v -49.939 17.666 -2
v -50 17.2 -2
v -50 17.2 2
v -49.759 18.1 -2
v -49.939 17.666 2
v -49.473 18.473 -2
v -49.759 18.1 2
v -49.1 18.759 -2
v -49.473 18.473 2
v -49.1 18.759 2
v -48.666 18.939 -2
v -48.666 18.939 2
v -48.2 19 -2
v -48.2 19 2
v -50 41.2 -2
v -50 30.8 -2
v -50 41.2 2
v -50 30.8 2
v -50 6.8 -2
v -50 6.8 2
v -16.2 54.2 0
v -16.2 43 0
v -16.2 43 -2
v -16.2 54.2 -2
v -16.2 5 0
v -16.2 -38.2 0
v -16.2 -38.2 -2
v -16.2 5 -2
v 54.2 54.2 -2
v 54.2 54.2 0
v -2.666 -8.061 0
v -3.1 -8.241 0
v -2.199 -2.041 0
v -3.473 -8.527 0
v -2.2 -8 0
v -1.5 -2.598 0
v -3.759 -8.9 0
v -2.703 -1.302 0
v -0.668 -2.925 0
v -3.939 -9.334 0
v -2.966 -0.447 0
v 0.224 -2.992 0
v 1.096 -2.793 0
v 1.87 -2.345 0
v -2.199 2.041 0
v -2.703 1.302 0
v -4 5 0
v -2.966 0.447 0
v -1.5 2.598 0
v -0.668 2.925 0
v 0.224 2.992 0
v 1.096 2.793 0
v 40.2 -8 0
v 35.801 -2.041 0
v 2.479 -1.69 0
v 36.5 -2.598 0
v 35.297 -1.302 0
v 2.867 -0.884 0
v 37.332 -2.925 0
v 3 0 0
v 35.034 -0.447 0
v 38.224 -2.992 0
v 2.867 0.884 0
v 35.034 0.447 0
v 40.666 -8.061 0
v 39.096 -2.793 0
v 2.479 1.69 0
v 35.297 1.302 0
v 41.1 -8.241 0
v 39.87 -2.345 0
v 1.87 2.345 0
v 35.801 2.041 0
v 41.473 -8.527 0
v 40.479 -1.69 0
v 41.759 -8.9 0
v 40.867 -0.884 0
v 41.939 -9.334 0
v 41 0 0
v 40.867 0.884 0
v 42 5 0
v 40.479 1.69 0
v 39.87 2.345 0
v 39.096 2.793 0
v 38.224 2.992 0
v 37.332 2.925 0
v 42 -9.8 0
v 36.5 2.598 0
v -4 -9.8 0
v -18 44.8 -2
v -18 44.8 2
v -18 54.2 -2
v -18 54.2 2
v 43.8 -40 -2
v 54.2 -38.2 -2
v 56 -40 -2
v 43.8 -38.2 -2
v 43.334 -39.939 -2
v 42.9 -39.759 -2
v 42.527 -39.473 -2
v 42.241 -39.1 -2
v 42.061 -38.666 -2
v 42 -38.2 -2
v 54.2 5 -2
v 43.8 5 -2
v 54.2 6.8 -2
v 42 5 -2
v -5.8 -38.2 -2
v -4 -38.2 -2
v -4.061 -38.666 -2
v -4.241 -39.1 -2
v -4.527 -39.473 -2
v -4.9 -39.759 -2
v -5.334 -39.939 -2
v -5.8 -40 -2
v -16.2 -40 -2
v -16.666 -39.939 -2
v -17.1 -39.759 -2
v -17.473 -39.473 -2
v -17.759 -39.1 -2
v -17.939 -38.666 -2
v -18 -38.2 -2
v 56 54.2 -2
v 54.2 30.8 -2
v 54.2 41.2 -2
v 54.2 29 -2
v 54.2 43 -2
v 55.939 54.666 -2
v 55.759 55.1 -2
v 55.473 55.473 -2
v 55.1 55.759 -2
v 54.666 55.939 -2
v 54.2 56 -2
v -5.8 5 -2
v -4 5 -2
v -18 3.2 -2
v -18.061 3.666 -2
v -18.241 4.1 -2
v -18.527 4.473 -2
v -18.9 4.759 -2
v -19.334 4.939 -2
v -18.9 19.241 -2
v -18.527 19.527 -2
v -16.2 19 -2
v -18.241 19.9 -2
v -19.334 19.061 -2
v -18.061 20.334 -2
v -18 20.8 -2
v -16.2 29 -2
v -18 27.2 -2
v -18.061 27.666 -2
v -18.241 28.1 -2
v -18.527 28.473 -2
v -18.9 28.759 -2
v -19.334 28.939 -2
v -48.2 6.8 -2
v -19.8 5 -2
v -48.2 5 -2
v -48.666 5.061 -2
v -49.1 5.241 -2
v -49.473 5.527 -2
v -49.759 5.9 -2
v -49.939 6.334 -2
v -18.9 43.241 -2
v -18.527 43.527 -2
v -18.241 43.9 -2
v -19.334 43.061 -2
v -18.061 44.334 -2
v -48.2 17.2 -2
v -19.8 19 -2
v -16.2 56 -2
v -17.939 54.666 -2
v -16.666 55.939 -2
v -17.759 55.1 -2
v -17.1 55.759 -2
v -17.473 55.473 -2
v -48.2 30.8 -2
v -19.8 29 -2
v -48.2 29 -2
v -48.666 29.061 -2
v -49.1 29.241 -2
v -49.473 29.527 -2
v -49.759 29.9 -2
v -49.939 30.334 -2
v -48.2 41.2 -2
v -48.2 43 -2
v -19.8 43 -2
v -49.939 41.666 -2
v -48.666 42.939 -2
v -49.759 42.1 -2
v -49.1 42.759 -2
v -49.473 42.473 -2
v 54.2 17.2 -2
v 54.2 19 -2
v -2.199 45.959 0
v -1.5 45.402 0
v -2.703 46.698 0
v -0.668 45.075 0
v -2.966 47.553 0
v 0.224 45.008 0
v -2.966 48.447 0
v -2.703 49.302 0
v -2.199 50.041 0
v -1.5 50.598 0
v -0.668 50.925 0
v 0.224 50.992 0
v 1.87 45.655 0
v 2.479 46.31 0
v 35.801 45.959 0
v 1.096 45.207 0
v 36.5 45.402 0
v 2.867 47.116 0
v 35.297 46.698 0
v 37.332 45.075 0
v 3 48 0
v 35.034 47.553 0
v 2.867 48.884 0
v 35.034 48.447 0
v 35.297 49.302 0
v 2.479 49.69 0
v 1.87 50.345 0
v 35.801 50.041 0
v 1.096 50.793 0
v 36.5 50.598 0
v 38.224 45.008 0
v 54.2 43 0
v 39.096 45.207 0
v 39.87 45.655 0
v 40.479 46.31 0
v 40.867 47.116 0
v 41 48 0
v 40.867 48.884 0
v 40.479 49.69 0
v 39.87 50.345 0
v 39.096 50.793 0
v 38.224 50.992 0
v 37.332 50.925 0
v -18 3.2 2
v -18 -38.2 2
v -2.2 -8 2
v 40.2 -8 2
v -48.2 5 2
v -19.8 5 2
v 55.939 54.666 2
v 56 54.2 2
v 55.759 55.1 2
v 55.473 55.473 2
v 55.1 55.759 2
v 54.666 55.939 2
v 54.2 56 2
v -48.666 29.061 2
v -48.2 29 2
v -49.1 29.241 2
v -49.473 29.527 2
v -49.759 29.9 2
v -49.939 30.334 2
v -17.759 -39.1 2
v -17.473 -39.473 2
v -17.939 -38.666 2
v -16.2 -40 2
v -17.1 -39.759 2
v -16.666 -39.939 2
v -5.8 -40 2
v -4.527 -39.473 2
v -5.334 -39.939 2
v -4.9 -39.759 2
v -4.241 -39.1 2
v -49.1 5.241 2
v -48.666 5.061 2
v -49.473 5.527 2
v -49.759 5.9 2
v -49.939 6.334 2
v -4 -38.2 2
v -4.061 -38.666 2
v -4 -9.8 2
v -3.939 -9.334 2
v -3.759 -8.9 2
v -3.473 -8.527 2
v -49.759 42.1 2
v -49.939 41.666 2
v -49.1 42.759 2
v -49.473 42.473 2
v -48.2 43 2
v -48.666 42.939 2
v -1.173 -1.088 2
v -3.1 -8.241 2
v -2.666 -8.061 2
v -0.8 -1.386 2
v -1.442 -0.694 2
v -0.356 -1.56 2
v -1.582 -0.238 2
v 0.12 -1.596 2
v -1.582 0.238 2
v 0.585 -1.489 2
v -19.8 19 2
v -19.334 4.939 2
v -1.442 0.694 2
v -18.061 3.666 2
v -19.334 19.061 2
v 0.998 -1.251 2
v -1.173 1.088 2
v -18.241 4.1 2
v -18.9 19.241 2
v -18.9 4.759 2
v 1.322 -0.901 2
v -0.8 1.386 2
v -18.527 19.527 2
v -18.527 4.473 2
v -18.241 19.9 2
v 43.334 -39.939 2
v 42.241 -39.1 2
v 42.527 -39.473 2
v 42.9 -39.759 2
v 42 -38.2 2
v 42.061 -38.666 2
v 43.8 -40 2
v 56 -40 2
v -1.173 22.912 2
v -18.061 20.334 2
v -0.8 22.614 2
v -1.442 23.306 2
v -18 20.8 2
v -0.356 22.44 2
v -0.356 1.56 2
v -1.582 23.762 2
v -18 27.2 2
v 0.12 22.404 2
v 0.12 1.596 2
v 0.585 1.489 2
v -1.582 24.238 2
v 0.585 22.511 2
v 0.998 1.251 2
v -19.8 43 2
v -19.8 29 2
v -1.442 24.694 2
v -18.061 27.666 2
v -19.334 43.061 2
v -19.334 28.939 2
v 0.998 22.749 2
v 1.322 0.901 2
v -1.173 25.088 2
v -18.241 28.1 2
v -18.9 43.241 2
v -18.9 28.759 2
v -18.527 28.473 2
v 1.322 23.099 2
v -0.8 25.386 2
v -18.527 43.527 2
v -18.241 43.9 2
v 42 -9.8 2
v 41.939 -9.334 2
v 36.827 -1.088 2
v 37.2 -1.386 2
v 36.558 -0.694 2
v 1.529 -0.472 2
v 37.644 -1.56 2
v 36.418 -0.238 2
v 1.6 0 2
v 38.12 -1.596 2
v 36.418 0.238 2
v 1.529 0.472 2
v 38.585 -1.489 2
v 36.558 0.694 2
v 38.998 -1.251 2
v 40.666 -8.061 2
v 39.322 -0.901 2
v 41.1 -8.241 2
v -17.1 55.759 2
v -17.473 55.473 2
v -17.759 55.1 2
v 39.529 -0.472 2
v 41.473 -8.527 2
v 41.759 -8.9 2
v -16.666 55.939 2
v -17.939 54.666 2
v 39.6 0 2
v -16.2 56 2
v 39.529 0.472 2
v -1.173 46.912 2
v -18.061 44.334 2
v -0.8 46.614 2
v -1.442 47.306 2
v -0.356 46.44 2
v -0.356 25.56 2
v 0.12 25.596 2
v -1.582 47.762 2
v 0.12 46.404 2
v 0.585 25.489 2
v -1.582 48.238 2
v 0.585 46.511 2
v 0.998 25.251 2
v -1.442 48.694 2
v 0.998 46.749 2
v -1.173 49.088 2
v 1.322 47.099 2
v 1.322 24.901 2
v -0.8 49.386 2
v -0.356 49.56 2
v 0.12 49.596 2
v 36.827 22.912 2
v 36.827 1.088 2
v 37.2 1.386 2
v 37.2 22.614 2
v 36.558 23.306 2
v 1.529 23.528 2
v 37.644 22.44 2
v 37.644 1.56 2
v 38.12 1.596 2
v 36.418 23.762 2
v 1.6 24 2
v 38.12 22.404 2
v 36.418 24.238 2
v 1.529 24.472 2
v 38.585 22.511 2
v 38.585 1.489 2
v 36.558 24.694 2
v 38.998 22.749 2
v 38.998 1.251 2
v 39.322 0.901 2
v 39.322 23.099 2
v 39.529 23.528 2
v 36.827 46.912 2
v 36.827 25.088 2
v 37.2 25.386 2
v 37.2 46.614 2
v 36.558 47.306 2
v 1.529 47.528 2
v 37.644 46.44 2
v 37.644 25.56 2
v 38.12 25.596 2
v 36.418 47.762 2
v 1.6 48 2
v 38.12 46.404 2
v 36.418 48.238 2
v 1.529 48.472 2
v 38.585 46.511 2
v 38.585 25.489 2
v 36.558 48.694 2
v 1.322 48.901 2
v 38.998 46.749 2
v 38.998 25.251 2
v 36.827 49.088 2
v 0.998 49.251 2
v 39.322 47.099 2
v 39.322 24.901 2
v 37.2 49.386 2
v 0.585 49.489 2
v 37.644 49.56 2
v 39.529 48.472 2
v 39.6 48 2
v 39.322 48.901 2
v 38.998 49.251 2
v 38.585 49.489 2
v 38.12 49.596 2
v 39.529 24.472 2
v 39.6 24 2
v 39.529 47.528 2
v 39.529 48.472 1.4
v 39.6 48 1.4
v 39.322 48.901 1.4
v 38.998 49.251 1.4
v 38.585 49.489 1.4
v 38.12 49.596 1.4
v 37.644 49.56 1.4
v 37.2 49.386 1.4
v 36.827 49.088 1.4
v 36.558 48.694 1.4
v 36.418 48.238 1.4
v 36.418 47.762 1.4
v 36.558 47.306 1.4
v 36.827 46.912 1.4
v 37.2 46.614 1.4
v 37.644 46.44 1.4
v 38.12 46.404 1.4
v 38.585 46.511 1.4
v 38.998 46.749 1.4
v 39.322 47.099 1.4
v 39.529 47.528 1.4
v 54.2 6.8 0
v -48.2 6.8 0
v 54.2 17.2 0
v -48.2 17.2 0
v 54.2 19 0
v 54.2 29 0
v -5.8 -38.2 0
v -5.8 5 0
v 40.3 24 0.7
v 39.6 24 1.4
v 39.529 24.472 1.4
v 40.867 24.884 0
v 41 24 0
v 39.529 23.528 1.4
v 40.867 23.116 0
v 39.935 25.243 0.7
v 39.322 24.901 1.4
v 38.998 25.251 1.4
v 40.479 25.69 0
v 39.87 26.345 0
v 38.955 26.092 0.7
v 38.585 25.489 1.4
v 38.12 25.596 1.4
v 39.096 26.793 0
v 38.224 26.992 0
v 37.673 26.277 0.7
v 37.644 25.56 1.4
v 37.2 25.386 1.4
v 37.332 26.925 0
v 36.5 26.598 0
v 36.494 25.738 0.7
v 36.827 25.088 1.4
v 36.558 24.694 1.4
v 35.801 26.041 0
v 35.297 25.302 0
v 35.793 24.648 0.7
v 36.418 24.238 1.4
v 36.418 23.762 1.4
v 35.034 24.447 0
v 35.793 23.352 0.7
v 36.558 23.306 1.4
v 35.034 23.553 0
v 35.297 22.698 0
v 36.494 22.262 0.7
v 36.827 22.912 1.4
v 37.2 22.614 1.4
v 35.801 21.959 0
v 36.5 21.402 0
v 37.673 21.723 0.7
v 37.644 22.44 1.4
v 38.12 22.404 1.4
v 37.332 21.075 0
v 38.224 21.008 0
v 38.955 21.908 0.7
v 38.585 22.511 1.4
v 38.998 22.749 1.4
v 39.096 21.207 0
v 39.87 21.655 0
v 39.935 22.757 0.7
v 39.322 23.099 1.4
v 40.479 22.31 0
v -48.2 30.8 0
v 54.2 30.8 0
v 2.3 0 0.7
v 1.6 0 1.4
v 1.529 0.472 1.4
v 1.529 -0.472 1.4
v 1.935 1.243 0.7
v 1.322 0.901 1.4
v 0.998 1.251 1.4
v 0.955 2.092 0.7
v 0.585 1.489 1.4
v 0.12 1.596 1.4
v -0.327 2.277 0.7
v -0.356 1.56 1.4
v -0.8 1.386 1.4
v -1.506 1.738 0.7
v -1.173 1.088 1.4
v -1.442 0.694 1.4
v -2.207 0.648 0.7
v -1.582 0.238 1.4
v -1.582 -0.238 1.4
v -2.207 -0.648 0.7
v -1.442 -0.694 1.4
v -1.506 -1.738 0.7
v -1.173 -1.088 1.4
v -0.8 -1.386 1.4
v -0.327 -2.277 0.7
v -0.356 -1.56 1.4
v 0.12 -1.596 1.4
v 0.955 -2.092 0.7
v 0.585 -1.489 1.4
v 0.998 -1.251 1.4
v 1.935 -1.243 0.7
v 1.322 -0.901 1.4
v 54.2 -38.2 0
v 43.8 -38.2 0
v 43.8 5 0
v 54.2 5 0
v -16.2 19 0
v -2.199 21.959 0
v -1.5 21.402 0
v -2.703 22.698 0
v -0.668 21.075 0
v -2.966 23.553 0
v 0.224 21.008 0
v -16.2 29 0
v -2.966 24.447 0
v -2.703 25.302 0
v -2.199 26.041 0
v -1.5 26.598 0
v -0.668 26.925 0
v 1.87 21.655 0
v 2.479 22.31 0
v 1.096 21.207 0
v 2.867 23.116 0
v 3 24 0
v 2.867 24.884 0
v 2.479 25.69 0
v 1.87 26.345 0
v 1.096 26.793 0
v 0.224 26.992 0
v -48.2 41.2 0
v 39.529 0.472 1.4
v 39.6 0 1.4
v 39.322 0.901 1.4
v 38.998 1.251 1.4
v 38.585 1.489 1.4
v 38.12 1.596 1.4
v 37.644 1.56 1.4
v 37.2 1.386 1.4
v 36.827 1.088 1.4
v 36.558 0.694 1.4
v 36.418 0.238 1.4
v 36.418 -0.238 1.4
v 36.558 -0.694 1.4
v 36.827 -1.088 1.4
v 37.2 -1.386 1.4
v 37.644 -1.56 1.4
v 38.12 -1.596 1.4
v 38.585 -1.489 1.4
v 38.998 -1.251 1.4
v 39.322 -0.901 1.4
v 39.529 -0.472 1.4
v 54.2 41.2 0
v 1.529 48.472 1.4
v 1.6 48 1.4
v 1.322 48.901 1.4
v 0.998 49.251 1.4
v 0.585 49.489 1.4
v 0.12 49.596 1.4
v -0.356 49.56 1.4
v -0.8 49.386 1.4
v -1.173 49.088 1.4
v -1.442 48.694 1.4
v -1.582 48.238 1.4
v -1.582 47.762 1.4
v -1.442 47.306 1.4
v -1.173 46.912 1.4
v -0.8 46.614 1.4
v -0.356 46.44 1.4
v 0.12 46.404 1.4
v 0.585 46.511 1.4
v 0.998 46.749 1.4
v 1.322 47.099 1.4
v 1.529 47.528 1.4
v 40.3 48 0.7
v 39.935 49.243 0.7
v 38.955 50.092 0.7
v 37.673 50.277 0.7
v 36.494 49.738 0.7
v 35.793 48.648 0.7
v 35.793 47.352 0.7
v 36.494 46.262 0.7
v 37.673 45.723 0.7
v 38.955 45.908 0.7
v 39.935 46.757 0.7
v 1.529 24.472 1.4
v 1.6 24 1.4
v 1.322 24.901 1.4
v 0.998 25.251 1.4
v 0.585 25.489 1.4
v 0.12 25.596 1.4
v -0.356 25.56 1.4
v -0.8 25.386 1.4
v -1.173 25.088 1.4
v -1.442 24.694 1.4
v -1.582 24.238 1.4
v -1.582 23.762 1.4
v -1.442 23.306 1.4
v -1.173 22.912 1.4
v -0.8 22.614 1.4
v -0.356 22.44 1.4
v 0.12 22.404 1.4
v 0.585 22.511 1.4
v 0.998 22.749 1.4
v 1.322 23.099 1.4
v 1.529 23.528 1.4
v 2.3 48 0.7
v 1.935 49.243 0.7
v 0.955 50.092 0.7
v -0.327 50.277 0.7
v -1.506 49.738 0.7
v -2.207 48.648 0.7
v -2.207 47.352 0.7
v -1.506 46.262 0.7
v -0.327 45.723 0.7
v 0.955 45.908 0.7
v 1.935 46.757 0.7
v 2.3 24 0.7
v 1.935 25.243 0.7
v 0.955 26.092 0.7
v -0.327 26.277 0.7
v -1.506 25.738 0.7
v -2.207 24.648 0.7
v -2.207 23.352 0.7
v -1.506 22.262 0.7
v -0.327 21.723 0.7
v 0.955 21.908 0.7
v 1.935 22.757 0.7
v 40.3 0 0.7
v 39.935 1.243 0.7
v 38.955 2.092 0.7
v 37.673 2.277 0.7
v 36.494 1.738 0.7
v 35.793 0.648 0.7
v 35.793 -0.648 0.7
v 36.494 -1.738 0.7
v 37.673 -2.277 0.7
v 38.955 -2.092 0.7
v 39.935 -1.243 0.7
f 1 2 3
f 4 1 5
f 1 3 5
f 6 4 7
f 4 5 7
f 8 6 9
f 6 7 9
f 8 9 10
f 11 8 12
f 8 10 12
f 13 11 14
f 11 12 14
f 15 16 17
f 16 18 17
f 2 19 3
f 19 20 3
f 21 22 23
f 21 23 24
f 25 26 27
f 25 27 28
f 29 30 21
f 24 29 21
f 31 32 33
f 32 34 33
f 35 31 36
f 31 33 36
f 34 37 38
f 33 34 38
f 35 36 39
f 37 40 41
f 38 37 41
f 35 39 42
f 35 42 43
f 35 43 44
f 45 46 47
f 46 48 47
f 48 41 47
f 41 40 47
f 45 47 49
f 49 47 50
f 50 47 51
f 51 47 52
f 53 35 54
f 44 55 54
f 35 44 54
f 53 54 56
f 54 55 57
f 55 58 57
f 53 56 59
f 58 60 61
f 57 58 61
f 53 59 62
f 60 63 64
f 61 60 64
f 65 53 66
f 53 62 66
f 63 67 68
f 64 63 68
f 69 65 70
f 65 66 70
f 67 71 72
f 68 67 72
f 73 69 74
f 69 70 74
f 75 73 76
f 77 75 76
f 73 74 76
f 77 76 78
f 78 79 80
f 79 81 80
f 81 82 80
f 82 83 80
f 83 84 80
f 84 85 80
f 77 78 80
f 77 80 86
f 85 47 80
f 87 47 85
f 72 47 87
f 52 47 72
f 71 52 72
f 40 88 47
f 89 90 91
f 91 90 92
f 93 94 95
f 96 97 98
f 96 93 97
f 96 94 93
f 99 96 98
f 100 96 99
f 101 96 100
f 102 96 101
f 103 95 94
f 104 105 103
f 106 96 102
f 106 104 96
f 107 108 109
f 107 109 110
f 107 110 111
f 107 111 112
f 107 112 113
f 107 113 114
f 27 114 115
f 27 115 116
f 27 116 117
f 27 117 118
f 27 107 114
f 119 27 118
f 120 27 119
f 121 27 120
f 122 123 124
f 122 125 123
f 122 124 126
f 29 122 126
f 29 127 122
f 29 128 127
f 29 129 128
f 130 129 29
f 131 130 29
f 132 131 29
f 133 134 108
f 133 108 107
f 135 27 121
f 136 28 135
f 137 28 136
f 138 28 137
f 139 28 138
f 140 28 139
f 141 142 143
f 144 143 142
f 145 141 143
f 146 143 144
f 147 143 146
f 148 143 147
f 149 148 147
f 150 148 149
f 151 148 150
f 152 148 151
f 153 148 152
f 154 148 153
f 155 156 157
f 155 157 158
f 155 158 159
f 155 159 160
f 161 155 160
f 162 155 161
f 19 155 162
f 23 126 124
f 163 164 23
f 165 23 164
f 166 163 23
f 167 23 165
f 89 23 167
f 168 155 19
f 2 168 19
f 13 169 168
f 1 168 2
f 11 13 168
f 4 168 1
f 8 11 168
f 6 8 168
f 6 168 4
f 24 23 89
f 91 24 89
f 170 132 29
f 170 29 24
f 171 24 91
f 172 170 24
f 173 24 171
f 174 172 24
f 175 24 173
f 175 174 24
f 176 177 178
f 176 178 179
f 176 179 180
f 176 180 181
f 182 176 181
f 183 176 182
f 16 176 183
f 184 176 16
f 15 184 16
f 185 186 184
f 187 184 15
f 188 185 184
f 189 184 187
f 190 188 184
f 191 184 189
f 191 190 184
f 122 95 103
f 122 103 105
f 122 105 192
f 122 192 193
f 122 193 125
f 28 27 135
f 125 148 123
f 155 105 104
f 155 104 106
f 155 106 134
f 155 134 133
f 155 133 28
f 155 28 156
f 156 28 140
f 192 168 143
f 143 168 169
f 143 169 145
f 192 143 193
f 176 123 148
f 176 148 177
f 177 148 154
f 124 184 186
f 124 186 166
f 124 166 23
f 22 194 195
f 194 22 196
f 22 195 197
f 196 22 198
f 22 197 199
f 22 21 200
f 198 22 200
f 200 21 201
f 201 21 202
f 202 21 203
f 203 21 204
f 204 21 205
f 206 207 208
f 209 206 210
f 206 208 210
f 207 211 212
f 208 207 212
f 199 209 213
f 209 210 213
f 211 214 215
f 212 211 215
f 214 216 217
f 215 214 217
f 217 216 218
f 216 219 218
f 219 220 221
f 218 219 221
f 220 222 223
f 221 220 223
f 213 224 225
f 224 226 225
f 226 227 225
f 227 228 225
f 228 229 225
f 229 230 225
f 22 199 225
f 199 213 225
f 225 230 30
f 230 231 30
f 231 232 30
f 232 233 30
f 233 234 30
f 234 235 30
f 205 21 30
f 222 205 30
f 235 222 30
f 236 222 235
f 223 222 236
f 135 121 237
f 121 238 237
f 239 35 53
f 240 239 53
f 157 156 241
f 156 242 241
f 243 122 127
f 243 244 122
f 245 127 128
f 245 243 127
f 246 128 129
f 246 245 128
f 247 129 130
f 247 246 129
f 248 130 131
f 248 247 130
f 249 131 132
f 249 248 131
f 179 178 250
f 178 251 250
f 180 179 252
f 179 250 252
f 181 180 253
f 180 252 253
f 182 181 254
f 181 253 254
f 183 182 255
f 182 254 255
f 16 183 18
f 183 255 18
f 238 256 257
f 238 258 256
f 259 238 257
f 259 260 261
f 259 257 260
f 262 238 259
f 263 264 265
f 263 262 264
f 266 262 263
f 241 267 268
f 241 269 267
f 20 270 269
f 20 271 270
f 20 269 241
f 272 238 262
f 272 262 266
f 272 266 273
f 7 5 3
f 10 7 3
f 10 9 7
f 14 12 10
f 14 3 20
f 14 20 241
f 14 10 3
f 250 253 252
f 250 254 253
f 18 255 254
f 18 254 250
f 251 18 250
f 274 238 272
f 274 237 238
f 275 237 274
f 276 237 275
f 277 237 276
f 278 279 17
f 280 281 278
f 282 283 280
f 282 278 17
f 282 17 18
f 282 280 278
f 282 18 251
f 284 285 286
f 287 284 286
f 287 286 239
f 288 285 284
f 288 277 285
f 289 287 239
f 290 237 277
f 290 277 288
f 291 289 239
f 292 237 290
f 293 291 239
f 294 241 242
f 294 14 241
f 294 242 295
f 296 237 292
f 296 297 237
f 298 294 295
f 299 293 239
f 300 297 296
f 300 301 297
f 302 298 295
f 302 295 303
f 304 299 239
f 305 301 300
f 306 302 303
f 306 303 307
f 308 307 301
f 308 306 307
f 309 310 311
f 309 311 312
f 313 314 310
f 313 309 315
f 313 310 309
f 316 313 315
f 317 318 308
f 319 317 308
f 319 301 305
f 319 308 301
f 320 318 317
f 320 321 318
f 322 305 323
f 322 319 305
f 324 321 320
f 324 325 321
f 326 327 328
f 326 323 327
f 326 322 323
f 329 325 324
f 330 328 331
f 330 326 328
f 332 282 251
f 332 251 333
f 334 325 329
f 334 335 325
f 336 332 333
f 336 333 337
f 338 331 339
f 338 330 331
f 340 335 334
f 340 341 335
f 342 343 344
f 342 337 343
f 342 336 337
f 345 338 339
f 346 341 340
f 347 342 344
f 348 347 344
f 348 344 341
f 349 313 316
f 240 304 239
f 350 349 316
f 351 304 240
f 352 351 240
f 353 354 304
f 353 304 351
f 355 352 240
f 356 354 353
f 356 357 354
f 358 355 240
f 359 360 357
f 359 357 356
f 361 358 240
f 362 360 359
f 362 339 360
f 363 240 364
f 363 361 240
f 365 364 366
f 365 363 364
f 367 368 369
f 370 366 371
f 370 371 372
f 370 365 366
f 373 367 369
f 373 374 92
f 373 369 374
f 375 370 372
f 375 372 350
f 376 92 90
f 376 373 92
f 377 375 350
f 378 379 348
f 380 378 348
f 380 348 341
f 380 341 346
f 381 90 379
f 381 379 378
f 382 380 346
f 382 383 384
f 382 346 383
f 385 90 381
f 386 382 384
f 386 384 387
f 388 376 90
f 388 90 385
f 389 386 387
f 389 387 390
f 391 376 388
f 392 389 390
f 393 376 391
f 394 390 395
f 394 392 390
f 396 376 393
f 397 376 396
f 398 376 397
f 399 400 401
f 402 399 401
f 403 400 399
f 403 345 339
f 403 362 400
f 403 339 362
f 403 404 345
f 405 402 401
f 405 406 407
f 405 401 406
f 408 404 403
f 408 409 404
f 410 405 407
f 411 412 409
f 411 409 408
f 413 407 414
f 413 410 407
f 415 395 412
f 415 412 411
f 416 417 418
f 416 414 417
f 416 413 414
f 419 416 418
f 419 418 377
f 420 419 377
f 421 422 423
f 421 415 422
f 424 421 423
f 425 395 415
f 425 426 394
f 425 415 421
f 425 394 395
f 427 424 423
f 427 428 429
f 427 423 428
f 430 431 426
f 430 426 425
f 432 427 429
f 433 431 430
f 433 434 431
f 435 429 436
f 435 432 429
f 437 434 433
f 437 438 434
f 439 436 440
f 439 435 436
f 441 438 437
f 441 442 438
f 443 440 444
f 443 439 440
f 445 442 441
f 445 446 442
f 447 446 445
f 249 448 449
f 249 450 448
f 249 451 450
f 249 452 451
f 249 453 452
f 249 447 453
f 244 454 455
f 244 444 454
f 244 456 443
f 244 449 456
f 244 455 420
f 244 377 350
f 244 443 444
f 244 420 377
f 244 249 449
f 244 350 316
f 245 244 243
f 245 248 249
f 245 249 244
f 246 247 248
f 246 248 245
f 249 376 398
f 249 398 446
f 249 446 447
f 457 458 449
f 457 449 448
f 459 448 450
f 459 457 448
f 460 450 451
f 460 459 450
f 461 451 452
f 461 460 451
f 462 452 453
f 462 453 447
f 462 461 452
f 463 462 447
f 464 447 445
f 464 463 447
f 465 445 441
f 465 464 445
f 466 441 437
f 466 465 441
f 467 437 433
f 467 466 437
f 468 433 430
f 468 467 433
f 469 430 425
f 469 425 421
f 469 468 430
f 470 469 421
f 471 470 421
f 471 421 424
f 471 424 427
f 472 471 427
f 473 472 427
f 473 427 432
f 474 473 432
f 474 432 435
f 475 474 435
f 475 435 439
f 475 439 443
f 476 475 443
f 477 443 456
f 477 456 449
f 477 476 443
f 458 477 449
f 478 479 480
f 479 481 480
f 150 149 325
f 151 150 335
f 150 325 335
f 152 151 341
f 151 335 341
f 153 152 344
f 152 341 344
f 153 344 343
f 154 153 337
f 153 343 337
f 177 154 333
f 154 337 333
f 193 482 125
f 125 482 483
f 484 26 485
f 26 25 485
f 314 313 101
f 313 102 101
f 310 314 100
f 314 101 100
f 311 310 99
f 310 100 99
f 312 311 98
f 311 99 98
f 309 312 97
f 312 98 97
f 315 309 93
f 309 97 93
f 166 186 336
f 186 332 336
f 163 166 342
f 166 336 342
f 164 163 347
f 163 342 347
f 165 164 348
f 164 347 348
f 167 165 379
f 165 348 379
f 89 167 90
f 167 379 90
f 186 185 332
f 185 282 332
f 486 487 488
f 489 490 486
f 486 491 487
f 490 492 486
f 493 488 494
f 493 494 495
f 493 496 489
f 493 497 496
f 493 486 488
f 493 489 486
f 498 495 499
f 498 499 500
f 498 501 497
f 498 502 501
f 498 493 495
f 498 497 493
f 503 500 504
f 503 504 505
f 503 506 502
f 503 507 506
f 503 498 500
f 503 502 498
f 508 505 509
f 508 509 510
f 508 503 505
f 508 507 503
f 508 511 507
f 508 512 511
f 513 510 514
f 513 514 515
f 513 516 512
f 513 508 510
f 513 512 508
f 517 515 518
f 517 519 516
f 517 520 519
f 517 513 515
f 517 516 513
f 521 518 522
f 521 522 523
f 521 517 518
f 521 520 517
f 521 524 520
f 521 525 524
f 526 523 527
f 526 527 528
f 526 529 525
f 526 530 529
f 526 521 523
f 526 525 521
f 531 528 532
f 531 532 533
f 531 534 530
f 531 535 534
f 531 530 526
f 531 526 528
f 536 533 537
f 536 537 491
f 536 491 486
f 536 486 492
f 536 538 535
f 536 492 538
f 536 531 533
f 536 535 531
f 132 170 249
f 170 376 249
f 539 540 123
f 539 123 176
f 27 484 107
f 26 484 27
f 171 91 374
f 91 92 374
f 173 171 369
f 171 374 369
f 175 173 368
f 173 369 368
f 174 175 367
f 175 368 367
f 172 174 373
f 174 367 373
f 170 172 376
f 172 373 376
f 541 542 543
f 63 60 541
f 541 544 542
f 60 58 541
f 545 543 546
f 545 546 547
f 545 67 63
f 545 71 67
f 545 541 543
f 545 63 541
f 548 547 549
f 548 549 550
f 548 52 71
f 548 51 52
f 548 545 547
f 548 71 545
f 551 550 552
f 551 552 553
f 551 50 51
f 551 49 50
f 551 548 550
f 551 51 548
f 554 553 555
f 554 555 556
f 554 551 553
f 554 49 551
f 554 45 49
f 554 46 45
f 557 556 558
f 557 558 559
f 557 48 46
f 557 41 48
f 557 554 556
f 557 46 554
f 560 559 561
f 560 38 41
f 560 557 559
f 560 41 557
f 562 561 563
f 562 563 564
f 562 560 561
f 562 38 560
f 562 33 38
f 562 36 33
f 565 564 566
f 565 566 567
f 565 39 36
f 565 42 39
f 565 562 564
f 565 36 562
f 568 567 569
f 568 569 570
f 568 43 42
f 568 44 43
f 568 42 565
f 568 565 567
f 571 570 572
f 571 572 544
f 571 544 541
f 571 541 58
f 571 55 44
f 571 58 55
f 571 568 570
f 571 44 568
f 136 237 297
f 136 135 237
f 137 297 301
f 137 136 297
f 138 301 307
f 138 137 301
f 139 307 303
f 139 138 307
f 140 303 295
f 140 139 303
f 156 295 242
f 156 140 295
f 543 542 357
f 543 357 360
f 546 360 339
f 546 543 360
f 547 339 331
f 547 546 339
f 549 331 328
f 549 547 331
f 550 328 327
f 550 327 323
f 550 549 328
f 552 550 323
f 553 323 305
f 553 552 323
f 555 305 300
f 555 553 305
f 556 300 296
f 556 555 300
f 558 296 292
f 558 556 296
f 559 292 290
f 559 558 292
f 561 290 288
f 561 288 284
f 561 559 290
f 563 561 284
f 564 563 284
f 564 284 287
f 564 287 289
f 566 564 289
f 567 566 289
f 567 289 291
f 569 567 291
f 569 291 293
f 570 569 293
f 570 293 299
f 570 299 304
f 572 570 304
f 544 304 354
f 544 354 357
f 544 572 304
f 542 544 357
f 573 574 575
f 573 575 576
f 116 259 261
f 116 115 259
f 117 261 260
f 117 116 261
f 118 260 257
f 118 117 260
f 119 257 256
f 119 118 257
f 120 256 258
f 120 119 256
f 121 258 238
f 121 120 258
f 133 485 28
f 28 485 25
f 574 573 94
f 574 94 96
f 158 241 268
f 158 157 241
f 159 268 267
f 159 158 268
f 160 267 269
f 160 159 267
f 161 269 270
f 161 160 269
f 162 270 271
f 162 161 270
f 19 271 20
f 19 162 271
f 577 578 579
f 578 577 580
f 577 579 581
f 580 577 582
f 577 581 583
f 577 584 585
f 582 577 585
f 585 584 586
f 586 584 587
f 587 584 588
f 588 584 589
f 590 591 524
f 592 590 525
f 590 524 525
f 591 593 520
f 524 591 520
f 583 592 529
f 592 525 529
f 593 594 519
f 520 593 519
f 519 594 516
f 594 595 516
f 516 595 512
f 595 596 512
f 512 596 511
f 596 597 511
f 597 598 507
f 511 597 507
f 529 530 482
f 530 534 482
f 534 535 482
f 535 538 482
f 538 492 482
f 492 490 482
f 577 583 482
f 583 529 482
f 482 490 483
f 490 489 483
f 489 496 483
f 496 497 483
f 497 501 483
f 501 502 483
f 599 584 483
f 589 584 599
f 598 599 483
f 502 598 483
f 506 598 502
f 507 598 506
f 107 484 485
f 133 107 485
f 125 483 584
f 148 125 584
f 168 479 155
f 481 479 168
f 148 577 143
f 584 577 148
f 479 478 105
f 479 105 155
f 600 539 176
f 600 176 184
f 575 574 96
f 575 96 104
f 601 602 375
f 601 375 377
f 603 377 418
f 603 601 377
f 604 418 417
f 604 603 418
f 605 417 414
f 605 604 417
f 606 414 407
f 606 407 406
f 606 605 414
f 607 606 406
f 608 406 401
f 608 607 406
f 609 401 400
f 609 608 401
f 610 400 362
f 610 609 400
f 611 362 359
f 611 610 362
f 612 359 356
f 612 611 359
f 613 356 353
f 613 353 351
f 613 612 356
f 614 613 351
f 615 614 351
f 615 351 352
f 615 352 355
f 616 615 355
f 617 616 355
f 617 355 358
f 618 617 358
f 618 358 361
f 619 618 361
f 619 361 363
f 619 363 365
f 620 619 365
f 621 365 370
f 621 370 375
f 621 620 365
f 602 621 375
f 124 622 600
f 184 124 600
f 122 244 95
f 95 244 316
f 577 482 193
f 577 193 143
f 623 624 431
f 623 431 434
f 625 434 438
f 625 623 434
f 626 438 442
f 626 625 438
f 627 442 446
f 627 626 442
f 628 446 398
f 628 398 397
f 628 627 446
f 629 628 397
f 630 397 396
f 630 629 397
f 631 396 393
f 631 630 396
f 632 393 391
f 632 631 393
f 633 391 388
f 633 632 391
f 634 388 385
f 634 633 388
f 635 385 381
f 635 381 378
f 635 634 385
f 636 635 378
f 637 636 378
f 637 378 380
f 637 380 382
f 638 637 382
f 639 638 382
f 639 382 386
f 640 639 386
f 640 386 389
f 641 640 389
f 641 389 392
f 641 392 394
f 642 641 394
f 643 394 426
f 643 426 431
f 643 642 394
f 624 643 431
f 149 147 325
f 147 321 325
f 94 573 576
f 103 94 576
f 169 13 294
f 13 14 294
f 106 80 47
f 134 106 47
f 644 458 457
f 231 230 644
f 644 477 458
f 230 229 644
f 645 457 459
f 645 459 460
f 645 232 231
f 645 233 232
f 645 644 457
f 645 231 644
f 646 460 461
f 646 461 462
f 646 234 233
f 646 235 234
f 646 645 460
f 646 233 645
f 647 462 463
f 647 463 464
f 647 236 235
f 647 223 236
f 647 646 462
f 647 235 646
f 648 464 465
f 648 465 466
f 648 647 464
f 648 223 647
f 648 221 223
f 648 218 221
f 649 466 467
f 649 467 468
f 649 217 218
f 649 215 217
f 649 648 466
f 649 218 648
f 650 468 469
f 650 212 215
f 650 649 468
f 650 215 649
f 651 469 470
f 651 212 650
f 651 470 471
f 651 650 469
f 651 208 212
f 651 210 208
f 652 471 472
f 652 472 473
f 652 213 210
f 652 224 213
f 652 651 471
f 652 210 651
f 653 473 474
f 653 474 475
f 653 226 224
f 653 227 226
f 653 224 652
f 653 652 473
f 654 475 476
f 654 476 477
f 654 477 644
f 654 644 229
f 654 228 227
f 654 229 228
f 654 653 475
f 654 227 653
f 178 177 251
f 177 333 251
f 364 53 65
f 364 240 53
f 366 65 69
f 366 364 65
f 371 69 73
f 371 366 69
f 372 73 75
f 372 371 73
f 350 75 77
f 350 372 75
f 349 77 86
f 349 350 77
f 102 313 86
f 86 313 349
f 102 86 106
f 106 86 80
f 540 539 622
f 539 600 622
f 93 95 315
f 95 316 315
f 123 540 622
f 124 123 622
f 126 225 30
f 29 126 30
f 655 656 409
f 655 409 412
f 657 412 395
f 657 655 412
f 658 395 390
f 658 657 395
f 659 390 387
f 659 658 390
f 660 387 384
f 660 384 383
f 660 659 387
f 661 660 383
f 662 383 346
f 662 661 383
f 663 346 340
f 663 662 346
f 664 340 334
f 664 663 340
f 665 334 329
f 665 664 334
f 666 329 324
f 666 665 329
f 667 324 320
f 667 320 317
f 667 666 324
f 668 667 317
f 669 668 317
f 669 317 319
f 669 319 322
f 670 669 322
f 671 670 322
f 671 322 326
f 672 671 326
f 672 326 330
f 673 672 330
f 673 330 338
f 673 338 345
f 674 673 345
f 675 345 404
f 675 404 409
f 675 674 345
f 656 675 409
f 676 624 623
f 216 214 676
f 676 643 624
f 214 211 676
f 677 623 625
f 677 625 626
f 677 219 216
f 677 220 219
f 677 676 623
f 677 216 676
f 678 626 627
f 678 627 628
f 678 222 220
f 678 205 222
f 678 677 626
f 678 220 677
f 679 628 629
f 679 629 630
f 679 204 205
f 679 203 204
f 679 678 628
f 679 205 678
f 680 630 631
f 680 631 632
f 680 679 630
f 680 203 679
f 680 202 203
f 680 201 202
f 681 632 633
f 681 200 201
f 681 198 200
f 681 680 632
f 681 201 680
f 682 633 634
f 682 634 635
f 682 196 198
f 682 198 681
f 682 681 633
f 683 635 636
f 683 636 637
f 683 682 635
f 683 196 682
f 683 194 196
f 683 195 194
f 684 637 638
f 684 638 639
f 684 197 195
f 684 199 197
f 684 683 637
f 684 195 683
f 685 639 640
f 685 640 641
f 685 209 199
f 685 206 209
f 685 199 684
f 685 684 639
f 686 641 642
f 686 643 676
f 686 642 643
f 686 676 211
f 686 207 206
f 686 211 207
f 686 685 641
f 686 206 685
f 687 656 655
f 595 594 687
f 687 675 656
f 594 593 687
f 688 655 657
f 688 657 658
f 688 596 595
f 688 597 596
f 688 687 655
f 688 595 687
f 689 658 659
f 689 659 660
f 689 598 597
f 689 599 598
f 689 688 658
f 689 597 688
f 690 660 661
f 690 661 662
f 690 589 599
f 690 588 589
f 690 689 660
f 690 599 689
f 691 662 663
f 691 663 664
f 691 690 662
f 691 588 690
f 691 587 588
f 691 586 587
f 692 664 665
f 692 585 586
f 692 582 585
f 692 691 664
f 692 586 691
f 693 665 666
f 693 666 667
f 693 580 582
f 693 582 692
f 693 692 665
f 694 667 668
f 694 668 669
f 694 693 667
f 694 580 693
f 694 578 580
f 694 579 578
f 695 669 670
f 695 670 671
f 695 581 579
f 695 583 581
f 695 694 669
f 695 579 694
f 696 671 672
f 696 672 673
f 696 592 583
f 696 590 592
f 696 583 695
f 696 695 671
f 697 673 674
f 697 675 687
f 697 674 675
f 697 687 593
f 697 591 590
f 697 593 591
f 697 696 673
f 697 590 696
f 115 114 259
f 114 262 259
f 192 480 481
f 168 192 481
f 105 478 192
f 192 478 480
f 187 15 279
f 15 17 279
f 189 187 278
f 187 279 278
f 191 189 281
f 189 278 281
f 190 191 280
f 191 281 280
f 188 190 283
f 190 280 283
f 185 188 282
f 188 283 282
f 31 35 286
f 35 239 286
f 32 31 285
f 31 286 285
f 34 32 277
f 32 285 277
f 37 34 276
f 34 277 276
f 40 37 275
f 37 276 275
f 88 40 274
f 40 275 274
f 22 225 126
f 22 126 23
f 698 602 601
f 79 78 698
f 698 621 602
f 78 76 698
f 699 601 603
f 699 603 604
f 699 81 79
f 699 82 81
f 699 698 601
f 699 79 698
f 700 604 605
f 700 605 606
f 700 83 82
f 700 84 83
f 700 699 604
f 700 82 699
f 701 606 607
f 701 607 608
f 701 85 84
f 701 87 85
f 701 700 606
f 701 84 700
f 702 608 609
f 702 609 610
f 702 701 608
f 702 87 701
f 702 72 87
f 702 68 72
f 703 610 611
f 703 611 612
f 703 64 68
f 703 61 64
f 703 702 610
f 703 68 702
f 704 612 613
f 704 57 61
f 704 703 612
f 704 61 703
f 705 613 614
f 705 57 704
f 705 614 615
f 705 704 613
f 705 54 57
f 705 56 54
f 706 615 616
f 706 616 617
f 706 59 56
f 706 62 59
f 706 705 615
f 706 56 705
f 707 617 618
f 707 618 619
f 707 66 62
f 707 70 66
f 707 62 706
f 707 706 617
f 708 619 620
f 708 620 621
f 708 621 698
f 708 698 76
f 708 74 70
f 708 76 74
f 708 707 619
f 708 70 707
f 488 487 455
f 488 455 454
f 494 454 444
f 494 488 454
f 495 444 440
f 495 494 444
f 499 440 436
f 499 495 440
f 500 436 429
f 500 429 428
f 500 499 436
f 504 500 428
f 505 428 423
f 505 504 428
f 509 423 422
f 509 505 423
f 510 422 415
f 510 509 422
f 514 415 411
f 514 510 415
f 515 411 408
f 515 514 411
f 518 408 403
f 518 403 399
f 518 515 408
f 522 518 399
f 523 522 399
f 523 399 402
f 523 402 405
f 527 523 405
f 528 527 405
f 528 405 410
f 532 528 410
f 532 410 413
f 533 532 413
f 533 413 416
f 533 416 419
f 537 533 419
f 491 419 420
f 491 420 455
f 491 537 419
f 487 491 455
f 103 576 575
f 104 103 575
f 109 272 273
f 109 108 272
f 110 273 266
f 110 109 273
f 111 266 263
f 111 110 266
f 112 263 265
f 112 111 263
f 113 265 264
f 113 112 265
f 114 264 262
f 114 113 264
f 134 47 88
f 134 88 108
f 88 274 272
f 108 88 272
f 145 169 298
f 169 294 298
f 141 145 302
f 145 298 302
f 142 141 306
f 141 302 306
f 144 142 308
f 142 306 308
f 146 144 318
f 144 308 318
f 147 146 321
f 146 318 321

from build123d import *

# Parameters (mm, degrees)
SKETCH_1_W      = 32
SKETCH_1_H      = 14
SKETCH_1_W_2    = 74
SKETCH_1_H_2    = 64
SKETCH_1_R      = 1.6
SKETCH_1_W_3    = 14
SKETCH_1_H_3    = 32
EXTRUDE_1_DEPTH = 2
CHAMFER_1_SIZE  = 1.4
SKETCH_2_W      = 10.4
SKETCH_2_H      = 43.2
SKETCH_2_W_2    = 102.4
SKETCH_2_H_2    = 10.4
SKETCH_2_W_3    = 70.4
SKETCH_2_H_3    = 10
SKETCH_2_H_4    = 11.2
EXTRUDE_2_DEPTH = 2
FILLET_1_R      = 1.8


with BuildPart() as part:
    # 草图1 → 凸台-拉伸1 (new body)
    # profile 1 of 5: a face of its own
    with BuildSketch(Plane.XY):
        with Locations((-34, 12)):
            Rectangle(SKETCH_1_W, SKETCH_1_H)
    # profile 2 of 5: a face of its own
    with BuildSketch(Plane.XY):
        with Locations((-34, 36)):
            Rectangle(SKETCH_1_W, SKETCH_1_H)
    # profile 3 of 5: a face of its own
    with BuildSketch(Plane.XY):
        with Locations((19, 24)):
            Rectangle(SKETCH_1_W_2, SKETCH_1_H_2)
        with Locations((0, 48)):
            Circle(SKETCH_1_R, mode=Mode.SUBTRACT)
        with Locations((0, 24)):
            Circle(SKETCH_1_R, mode=Mode.SUBTRACT)
        with Locations((38, 48)):
            Circle(SKETCH_1_R, mode=Mode.SUBTRACT)
        with Locations((38, 24)):
            Circle(SKETCH_1_R, mode=Mode.SUBTRACT)
        with Locations((38, 0)):
            Circle(SKETCH_1_R, mode=Mode.SUBTRACT)
        Circle(SKETCH_1_R, mode=Mode.SUBTRACT)
    # profile 4 of 5: a face of its own
    with BuildSketch(Plane.XY):
        with Locations((-11, -24)):
            Rectangle(SKETCH_1_W_3, SKETCH_1_H_3)
    # profile 5 of 5: a face of its own
    with BuildSketch(Plane.XY):
        with Locations((49, -24)):
            Rectangle(SKETCH_1_W_3, SKETCH_1_H_3)
    extrude(amount=EXTRUDE_1_DEPTH)

    # 倒角1
    chamfer_1_edges = [part.edges().sort_by_distance(p)[0] for p in [
        (-1.6, 0, 0),
        (36.4, 0, 0),
        (36.4, 24, 0),
        (36.4, 48, 0),
        (-1.6, 24, 0),
        (-1.6, 48, 0),
    ]]
    chamfer(chamfer_1_edges, length=CHAMFER_1_SIZE)

    # 草图2 → 凸台-拉伸2 (add)
    with BuildSketch(Plane(origin=(0, 0, 0), x_dir=(-1, 0, 0), z_dir=(0, 0, -1))):
        Polygon((-56, 56), (-56, -40), (-42, -40), (-42, 5), (4, 5), (4, -40), (18, -40), (18, 5), (50, 5), (50, 19), (18, 19), (18, 29), (50, 29), (50, 43), (18, 43), (18, 56), align=None)
        with Locations((11, -16.6)):
            Rectangle(SKETCH_2_W, SKETCH_2_H, mode=Mode.SUBTRACT)
        with Locations((-49, -16.6)):
            Rectangle(SKETCH_2_W, SKETCH_2_H, mode=Mode.SUBTRACT)
        with Locations((-3, 12)):
            Rectangle(SKETCH_2_W_2, SKETCH_2_H_2, mode=Mode.SUBTRACT)
        with Locations((-19, 24)):
            Rectangle(SKETCH_2_W_3, SKETCH_2_H_3, mode=Mode.SUBTRACT)
        with Locations((-3, 36)):
            Rectangle(SKETCH_2_W_2, SKETCH_2_H_2, mode=Mode.SUBTRACT)
        with Locations((-19, 48.6)):
            Rectangle(SKETCH_2_W_3, SKETCH_2_H_4, mode=Mode.SUBTRACT)
    extrude(amount=EXTRUDE_2_DEPTH)

    # 圆角1
    fillet_1_edges = [part.edges().sort_by_distance(p)[0] for p in [
        (-18, 19, 0),
        (-18, 29, 0),
        (-50, 29, 0),
        (-50, 43, 0),
        (-18, 43, 0),
        (-18, 56, 0),
        (56, 56, 0),
        (42, -40, 0),
        (42, -8, 1),
        (-4, -8, 1),
        (-4, -40, 0),
        (-18, -40, 0),
        (-18, 5, 0),
        (-50, 5, 0),
        (-50, 19, 0),
    ]]
    fillet(fillet_1_edges, radius=FILLET_1_R)


solid = part.part
